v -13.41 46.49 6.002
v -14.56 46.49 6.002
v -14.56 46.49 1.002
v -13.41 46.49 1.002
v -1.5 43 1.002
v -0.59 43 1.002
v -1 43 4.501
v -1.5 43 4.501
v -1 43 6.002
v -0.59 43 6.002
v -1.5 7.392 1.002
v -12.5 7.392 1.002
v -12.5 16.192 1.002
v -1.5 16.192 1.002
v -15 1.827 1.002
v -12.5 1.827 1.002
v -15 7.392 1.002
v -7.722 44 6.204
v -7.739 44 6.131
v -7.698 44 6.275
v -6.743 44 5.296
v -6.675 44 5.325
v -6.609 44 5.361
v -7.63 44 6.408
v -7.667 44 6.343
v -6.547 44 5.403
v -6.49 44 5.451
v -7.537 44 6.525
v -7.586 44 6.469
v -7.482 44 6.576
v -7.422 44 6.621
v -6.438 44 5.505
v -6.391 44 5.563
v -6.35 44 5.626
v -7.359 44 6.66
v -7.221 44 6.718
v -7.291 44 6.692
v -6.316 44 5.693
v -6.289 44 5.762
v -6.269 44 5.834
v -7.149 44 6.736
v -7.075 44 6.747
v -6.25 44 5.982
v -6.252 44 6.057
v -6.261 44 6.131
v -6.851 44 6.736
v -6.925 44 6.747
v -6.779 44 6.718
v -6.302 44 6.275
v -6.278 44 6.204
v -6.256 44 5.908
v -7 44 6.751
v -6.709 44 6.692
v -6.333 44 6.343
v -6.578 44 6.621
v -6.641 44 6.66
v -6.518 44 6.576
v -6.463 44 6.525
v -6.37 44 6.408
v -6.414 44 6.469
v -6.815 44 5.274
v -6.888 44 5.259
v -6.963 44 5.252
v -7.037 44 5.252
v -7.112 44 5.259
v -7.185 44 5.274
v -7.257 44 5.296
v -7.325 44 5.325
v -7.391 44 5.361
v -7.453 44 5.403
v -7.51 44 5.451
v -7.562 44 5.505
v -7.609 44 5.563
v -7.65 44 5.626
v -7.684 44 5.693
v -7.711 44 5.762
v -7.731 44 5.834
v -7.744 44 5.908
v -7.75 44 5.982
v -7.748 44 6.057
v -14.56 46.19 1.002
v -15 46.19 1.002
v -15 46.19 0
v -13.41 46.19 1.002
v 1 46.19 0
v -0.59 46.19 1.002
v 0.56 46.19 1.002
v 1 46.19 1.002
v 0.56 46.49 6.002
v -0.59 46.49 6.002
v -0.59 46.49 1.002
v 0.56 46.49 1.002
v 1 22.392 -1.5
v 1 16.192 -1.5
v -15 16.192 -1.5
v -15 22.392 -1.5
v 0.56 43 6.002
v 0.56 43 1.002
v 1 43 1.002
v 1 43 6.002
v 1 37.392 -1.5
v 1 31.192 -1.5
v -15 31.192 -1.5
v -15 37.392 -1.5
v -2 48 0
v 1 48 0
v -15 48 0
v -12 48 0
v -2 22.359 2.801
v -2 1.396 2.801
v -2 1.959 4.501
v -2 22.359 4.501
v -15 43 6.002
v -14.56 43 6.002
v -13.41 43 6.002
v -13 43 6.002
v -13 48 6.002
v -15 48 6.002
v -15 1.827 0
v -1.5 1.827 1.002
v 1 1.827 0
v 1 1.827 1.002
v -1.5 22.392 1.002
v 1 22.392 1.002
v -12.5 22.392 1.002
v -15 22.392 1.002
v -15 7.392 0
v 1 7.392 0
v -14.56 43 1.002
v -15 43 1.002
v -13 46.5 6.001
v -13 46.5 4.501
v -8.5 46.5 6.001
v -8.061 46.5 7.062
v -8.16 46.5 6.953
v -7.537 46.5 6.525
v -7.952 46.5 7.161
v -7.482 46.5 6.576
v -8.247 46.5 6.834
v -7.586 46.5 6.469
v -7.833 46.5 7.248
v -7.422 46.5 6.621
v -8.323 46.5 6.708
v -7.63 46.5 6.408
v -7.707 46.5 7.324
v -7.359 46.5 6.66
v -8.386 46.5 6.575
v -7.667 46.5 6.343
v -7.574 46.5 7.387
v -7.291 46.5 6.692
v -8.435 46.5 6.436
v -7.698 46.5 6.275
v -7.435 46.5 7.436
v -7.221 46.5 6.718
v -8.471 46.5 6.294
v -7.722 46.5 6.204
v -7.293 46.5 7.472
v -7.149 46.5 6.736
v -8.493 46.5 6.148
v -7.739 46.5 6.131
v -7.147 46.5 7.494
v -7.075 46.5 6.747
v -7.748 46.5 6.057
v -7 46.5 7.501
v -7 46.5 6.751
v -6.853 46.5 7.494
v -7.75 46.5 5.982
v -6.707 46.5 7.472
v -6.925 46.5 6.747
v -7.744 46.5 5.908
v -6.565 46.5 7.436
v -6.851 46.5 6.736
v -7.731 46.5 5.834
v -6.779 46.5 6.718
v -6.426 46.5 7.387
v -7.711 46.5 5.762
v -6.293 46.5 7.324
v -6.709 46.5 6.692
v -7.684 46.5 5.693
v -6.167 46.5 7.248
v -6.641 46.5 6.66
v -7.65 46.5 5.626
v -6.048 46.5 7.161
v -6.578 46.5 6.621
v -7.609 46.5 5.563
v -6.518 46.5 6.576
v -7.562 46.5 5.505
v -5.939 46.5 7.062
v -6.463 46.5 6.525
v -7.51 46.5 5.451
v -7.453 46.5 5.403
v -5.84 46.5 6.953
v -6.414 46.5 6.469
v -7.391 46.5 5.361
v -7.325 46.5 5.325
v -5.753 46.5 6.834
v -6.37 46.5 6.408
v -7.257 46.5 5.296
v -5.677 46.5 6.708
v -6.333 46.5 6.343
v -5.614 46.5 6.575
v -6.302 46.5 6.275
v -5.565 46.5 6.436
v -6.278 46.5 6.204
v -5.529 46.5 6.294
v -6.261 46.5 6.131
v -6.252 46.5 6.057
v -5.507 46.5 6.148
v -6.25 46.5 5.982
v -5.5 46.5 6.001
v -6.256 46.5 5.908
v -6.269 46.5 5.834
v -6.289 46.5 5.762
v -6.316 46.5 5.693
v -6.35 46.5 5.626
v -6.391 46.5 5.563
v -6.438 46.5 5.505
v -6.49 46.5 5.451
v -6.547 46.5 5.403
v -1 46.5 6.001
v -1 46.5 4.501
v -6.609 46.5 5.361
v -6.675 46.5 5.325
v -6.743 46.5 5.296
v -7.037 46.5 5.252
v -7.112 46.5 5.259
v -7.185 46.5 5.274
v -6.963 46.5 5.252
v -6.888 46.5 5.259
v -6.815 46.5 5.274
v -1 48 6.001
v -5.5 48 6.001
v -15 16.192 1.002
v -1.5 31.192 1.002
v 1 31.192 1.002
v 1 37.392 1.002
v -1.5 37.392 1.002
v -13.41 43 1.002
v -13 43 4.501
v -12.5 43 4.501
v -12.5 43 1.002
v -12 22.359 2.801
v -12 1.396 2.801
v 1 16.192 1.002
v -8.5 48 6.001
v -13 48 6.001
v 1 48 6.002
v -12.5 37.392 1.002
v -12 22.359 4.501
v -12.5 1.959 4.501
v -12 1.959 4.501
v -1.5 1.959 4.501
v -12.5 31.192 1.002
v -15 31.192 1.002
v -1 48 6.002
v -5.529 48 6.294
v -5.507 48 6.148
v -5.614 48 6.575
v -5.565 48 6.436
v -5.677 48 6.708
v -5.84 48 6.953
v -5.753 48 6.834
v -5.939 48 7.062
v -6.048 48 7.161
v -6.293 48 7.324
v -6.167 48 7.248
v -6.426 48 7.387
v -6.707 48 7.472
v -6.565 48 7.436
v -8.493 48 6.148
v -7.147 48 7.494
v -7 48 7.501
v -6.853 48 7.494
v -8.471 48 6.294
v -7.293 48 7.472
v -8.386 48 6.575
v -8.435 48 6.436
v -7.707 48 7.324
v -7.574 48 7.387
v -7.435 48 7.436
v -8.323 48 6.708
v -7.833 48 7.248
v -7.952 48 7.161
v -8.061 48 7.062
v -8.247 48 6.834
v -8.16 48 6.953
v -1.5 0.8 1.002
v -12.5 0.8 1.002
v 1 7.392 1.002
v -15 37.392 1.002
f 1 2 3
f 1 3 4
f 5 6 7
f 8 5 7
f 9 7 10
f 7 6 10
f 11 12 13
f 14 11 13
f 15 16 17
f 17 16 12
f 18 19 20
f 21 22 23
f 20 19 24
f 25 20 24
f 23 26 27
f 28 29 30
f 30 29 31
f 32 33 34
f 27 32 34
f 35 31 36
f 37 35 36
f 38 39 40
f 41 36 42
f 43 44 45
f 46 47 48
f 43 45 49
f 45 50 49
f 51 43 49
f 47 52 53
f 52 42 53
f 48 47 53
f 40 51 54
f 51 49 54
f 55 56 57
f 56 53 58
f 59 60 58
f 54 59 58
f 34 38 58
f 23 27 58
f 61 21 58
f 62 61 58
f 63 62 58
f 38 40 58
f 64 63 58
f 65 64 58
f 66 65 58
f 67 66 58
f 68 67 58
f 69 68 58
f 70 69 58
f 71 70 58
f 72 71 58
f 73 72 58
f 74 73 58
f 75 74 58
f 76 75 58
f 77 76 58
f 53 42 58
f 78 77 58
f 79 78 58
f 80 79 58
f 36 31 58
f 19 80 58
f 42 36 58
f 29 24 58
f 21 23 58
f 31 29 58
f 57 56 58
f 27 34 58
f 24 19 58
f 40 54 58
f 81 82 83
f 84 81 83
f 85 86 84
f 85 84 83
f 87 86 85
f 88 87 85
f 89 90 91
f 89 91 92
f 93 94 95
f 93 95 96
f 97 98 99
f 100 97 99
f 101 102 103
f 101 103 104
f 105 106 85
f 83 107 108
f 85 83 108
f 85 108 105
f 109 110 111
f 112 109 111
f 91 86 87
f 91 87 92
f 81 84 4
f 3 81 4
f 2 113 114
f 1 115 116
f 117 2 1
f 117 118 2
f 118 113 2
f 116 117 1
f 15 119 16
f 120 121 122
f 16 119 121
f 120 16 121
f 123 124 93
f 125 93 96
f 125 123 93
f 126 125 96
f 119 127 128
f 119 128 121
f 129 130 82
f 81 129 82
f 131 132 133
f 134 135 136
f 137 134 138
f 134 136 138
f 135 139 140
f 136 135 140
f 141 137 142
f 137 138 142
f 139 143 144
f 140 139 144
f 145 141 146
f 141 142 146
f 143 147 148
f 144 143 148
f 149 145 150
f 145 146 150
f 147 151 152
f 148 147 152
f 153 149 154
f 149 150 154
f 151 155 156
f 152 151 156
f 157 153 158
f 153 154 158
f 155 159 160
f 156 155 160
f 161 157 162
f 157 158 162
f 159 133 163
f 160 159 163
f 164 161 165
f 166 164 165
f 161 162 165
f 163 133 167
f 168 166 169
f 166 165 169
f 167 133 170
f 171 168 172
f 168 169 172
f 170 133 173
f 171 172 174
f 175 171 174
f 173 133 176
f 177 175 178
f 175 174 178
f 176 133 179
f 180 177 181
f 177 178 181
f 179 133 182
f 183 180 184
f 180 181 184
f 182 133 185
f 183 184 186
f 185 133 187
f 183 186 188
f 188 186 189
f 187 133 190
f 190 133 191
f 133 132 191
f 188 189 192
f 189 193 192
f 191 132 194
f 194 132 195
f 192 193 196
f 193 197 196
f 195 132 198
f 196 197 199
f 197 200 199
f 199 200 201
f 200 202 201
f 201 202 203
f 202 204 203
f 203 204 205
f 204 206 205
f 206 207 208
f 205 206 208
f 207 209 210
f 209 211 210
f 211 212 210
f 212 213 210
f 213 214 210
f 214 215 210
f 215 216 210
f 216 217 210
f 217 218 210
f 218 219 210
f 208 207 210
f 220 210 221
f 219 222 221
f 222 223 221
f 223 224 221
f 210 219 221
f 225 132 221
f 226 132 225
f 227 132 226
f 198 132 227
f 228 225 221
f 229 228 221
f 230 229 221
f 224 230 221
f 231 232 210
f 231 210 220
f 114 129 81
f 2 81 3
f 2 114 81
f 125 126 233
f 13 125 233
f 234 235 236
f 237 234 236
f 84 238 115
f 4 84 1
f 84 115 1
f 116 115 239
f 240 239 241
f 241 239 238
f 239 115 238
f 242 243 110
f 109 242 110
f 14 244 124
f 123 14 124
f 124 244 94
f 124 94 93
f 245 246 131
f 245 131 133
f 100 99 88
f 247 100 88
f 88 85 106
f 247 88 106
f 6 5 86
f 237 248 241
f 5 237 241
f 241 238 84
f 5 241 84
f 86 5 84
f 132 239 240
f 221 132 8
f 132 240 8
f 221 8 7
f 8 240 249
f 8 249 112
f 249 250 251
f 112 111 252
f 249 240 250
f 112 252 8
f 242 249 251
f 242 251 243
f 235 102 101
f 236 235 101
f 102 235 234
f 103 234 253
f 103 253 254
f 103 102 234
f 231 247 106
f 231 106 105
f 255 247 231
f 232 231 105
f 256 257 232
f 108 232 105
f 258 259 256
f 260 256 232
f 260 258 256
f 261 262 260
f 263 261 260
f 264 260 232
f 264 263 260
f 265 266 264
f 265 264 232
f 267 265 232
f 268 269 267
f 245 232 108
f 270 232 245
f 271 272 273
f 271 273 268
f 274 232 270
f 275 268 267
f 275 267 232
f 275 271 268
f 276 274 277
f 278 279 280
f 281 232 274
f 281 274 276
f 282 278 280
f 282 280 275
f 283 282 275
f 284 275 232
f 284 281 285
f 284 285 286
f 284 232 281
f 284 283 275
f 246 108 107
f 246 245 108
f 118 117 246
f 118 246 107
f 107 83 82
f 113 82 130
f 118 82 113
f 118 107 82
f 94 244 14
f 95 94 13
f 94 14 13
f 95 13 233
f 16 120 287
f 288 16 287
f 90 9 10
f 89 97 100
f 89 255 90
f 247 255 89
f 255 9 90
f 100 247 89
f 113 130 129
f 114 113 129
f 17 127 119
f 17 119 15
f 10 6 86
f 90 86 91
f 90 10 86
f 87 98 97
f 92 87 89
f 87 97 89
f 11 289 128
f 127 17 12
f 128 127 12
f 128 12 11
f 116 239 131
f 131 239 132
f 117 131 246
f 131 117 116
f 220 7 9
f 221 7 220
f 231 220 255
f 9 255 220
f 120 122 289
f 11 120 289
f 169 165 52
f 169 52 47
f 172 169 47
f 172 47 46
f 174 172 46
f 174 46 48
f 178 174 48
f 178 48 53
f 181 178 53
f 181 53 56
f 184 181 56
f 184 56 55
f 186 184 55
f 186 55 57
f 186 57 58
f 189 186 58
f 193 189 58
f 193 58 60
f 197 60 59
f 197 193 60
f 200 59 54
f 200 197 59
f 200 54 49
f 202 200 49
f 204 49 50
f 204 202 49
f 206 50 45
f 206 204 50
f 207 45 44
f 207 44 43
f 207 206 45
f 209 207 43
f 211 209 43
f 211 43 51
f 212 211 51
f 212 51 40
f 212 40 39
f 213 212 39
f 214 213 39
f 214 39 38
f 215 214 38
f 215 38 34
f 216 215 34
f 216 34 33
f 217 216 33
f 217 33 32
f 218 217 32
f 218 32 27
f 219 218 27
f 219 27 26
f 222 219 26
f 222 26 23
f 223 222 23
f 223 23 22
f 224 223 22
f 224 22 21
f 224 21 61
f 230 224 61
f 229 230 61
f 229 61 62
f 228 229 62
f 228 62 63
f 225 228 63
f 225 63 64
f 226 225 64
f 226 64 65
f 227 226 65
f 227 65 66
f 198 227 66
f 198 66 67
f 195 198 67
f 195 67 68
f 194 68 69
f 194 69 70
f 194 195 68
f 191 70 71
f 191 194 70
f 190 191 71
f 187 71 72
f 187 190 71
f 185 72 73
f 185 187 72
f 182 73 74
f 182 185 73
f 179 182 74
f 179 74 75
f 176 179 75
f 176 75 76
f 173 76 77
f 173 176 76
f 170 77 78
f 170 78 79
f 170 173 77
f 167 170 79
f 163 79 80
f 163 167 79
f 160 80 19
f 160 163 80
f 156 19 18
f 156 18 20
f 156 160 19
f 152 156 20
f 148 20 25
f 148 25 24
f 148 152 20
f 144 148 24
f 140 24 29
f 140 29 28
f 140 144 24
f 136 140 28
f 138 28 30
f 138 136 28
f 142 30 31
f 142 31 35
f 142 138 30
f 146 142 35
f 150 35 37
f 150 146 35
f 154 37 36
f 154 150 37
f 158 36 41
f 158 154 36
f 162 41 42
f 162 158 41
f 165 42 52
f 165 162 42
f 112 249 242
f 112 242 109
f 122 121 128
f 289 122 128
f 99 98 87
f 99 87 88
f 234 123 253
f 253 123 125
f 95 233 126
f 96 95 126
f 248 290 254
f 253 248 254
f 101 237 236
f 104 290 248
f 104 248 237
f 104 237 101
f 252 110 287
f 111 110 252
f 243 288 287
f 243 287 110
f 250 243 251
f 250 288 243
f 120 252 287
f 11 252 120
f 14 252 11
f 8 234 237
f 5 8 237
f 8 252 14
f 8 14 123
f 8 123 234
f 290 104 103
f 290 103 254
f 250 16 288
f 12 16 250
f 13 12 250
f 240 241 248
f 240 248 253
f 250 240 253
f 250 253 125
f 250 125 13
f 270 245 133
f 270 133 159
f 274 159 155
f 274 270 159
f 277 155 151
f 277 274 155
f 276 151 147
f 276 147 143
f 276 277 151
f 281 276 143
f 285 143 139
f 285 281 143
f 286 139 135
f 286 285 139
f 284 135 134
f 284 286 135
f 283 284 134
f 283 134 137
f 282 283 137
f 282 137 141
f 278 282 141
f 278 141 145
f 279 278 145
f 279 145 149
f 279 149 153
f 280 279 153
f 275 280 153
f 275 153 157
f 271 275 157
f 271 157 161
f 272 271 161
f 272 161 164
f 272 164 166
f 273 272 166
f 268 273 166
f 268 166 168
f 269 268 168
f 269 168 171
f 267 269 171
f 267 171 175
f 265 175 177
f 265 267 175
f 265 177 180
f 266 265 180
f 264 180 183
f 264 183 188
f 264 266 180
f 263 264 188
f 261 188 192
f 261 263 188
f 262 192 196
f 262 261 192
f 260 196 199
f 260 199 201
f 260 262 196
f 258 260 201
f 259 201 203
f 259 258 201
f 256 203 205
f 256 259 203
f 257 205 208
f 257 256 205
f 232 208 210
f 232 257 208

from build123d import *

# Parameters (mm, degrees)
SKETCH2_W            = 14
SKETCH2_H            = 48
BOSS_EXTRUDE1_DEPTH  = 8
SKETCH3_W            = 10
SKETCH3_H            = 3.5
CUT_EXTRUDE1_DEPTH   = 51.635955605
CUT_EXTRUDE4_DEPTH   = 48
CUT_EXTRUDE5_REACH   = 51.933
SKETCH16_W           = 1.002160824
SKETCH16_H           = 48
BOSS_EXTRUDE4_DEPTH  = 1
SKETCH17_W           = 1.002160824
SKETCH17_H           = 48
BOSS_EXTRUDE5_DEPTH  = 1
SKETCH25_W           = 2
SKETCH25_H           = 5
BOSS_EXTRUDE10_DEPTH = 5
SKETCH26_W           = 12
SKETCH26_H           = 1.5
BOSS_EXTRUDE11_DEPTH = 1.5
SKETCH27_R           = 1.5
BOSS_EXTRUDE14_DEPTH = 1.5
SKETCH29_R           = 0.75
CUT_EXTRUDE12_DEPTH  = 1.5
SKETCH30_W           = 1.15
SKETCH30_H           = 3.49
CUT_EXTRUDE13_DEPTH  = 5
SKETCH32_W           = 10
SKETCH32_H           = 47.172433363
BOSS_EXTRUDE15_DEPTH = 3.5
BOSS_EXTRUDE16_DEPTH = 10
SKETCH34_W           = 10
SKETCH34_H           = 20.2
CUT_EXTRUDE15_DEPTH  = 1.7
SKETCH35_W           = 10
SKETCH35_H           = 1.7
CUT_EXTRUDE16_DEPTH  = 1
CUT_EXTRUDE18_START  = -16
SKETCH38_W           = 1.002160824
SKETCH38_H           = 8.4
SKETCH38_H_2         = 8.398563286
CUT_EXTRUDE18_DEPTH  = 16
CUT_EXTRUDE19_DEPTH  = 20
SKETCH43_W           = 16
SKETCH43_H           = 1.002160824
CUT_EXTRUDE20_DEPTH  = 0.4
SKETCH44_W           = 16
SKETCH44_H           = 1.002160824
CUT_EXTRUDE21_DEPTH  = 0.4
SKETCH45_W           = 16
SKETCH45_H           = 1.002160824
CUT_EXTRUDE22_DEPTH  = 0.4
SKETCH46_R           = 0.75
BOSS_EXTRUDE18_DEPTH = 4
SKETCH47_W           = 10
SKETCH47_H           = 1.7
CUT_EXTRUDE23_DEPTH  = 1
CUT_EXTRUDE24_DEPTH  = 0.5
CUT_EXTRUDE25_DEPTH  = 0.5
CUT_EXTRUDE26_DEPTH  = 52.14944604
SKETCH51_W           = 16
SKETCH51_H           = 6.2
BOSS_EXTRUDE19_DEPTH = 2
SKETCH52_W           = 0.5
SKETCH52_H           = 6.2
CUT_EXTRUDE27_DEPTH  = 16
SKETCH53_W           = 0.5
SKETCH53_H           = 6.2
CUT_EXTRUDE28_DEPTH  = 16


with BuildPart() as part:
    # Sketch2 → Boss-Extrude1 (new body)
    with BuildSketch(Plane.XY):
        with Locations((-7, 24)):
            Rectangle(SKETCH2_W, SKETCH2_H)
    extrude(amount=BOSS_EXTRUDE1_DEPTH)

    # Sketch3 → Cut-Extrude1 (cut, through all)
    with BuildSketch(Plane(origin=(0, 0, 0), x_dir=(-1, 0, 0), z_dir=(0, -1, 0))):
        with Locations((7, -1.75)):
            Rectangle(SKETCH3_W, SKETCH3_H)
    extrude(amount=-CUT_EXTRUDE1_DEPTH, mode=Mode.SUBTRACT)

    # Sketch7 → Cut-Extrude4 (cut)
    with BuildSketch(Plane.XZ):
        Polygon((-14, 1.002160824), (-13, 1.002160824), (-13, 4.501055273), (-1, 4.501055273), (-1, 1.002160824), (0, 1.002160824), (0, 8), (-14, 8), align=None)
    extrude(amount=-CUT_EXTRUDE4_DEPTH, mode=Mode.SUBTRACT)

    # Cut-Extrude5: up to this face of the body (flat: up to its plane)
    cut_extrude5_end = Plane(part.part.faces().sort_by_distance((-1, 24, 2.751608048))[0])
    # Sketch9 → Cut-Extrude5 (cut, up to the picked face)
    with BuildSketch(Plane.ZY.offset(13), mode=Mode.PRIVATE) as cut_extrude5_sk1:
        Polygon((1.002160824, 0), (4.501055273, 1.159229281), (4.501055273, 0), align=None)
    cut_extrude5_tool1 = split(extrude(cut_extrude5_sk1.sketch, amount=-CUT_EXTRUDE5_REACH, mode=Mode.PRIVATE), bisect_by=cut_extrude5_end, keep=Keep.BOTH, mode=Mode.PRIVATE)
    add(cut_extrude5_tool1.solids().sort_by(Axis((-13, 0.38641, 3.334757), (1, 0, 0)))[0], mode=Mode.SUBTRACT)

    # Sketch16 → Boss-Extrude4 (add)
    with BuildSketch(Plane(origin=(0, 0, 0), x_dir=(0, 0, -1), z_dir=(1, 0, 0))):
        with Locations((-0.501080412, 24)):
            Rectangle(SKETCH16_W, SKETCH16_H)
    extrude(amount=BOSS_EXTRUDE4_DEPTH)

    # Sketch17 → Boss-Extrude5 (add)
    with BuildSketch(Plane.ZY.offset(14)):
        with Locations((0.501080412, 24)):
            Rectangle(SKETCH17_W, SKETCH17_H)
    extrude(amount=BOSS_EXTRUDE5_DEPTH)

    # Sketch25 → Boss-Extrude10 (add)
    with BuildSketch(Plane.XY.offset(1.002160824)):
        with Locations((0, 45.5)):
            Rectangle(SKETCH25_W, SKETCH25_H)
        with Locations((-14, 45.5)):
            Rectangle(SKETCH25_W, SKETCH25_H)
    extrude(amount=BOSS_EXTRUDE10_DEPTH)

    # Sketch26 → Boss-Extrude11 (add)
    with BuildSketch(Plane.XY.offset(4.501055273)):
        with Locations((-7, 47.25)):
            Rectangle(SKETCH26_W, SKETCH26_H)
    extrude(amount=BOSS_EXTRUDE11_DEPTH)

    # Sketch27 → Boss-Extrude14 (add)
    with BuildSketch(Plane(origin=(0, 48, 0), x_dir=(1, 0, 0), z_dir=(0, 1, 0))):
        with Locations((-7.000000094, -6.001055273)):
            Circle(SKETCH27_R)
    extrude(amount=-BOSS_EXTRUDE14_DEPTH)

    # Sketch29 → Cut-Extrude12 (cut)
    with BuildSketch(Plane(origin=(0, 48, 0), x_dir=(1, 0, 0), z_dir=(0, 1, 0))):
        with Locations(Location((-7.000000094, -6.001055273, 0), (0, 0, 270))):
            Circle(SKETCH29_R)
    extrude(amount=-CUT_EXTRUDE12_DEPTH, mode=Mode.SUBTRACT)

    # Sketch30 → Cut-Extrude13 (cut)
    with BuildSketch(Plane.XY.offset(6.002160824)):
        with Locations((-13.985, 44.745)):
            Rectangle(SKETCH30_W, SKETCH30_H)
        with Locations((-0.015, 44.745)):
            Rectangle(SKETCH30_W, SKETCH30_H)
    extrude(amount=-CUT_EXTRUDE13_DEPTH, mode=Mode.SUBTRACT)

    # Sketch32 → Boss-Extrude15 (add)
    with BuildSketch(Plane(origin=(0, 0, 3.5), x_dir=(-1, 0, 0), z_dir=(0, 0, -1))):
        with Locations((7, 24.413783318)):
            Rectangle(SKETCH32_W, SKETCH32_H)
    extrude(amount=BOSS_EXTRUDE15_DEPTH)

    # Sketch33 → Boss-Extrude16 (add)
    with BuildSketch(Plane(origin=(-12, 0, 0), x_dir=(0, 0, -1), z_dir=(1, 0, 0))):
        Polygon((-3.5, 0.827566637), (0, 0.827566637), (0, -0.332028927), align=None)
    extrude(amount=BOSS_EXTRUDE16_DEPTH)

    # Sketch34 → Cut-Extrude15 (cut)
    with BuildSketch(Plane.XY.offset(4.501055273)):
        with Locations((-7, 11.259229281)):
            Rectangle(SKETCH34_W, SKETCH34_H)
    extrude(amount=-CUT_EXTRUDE15_DEPTH, mode=Mode.SUBTRACT)

    # Sketch35 → Cut-Extrude16 (cut)
    with BuildSketch(Plane(origin=(0, 1.159229281, 0), x_dir=(1, 0, 0), z_dir=(0, 1, 0))):
        with Locations((-7, -3.651055273)):
            Rectangle(SKETCH35_W, SKETCH35_H)
    extrude(amount=-CUT_EXTRUDE16_DEPTH, mode=Mode.SUBTRACT)

    # Sketch38 → Cut-Extrude18 (cut)
    with BuildSketch(Plane(origin=(1, 0, 0), x_dir=(0, 0, -1), z_dir=(1, 0, 0)).offset(CUT_EXTRUDE18_START)):
        with Locations((-0.501080412, 11.591582536)):
            Rectangle(SKETCH38_W, SKETCH38_H)
        with Locations((-0.501080412, 26.591582536)):
            Rectangle(SKETCH38_W, SKETCH38_H)
        with Locations((-0.501080412, 41.590864179)):
            Rectangle(SKETCH38_W, SKETCH38_H_2)
    extrude(amount=CUT_EXTRUDE18_DEPTH, mode=Mode.SUBTRACT)

    # Sketch40 → Cut-Extrude19 (cut)
    with BuildSketch(Plane.ZY.offset(15)):
        Polygon((4.501055273, 1.159229281), (0, -0.332028927), (0, 0.467971073), (4.501055273, 1.959229281), align=None)
    extrude(amount=-CUT_EXTRUDE19_DEPTH, mode=Mode.SUBTRACT)

    # Sketch43 → Cut-Extrude20 (cut)
    with BuildSketch(Plane.XZ.offset(-45.790145822)):
        with Locations((-7, 0.501080412)):
            Rectangle(SKETCH43_W, SKETCH43_H)
    extrude(amount=-CUT_EXTRUDE20_DEPTH, mode=Mode.SUBTRACT)

    # Sketch44 → Cut-Extrude21 (cut)
    with BuildSketch(Plane(origin=(0, 30.791582536, 0), x_dir=(-1, 0, 0), z_dir=(0, -1, 0))):
        with Locations((7, -0.501080412)):
            Rectangle(SKETCH44_W, SKETCH44_H)
    extrude(amount=-CUT_EXTRUDE21_DEPTH, mode=Mode.SUBTRACT)

    # Sketch45 → Cut-Extrude22 (cut)
    with BuildSketch(Plane.XZ.offset(-15.791582536)):
        with Locations((-7, 0.501080412)):
            Rectangle(SKETCH45_W, SKETCH45_H)
    extrude(amount=-CUT_EXTRUDE22_DEPTH, mode=Mode.SUBTRACT)

    # Sketch46 → Boss-Extrude18 (add)
    with BuildSketch(Plane(origin=(0, 48, 0), x_dir=(1, 0, 0), z_dir=(0, 1, 0))):
        with Locations(Location((-7.000000094, -6.001055273, 0), (0, 0, 270))):
            Circle(SKETCH46_R)
    extrude(amount=-BOSS_EXTRUDE18_DEPTH)

    # Sketch47 → Cut-Extrude23 (cut)
    with BuildSketch(Plane.XZ.offset(-21.359229281)):
        with Locations((-7, 3.651055273)):
            Rectangle(SKETCH47_W, SKETCH47_H)
    extrude(amount=-CUT_EXTRUDE23_DEPTH, mode=Mode.SUBTRACT)

    # Sketch48 → Cut-Extrude24 (cut)
    with BuildSketch(Plane(origin=(-1, 0, 0), x_dir=(0, 0, -1), z_dir=(1, 0, 0))):
        Polygon((-4.501055273, 1.959229281), (-1.002160824, 0.8), (-1.002160824, 43), (-4.501055273, 43), align=None)
    extrude(amount=-CUT_EXTRUDE24_DEPTH, mode=Mode.SUBTRACT)

    # Sketch49 → Cut-Extrude25 (cut)
    with BuildSketch(Plane.ZY.offset(13)):
        Polygon((1.002160824, 0.8), (4.501055273, 1.959229281), (4.501055273, 43), (1.002160824, 43), align=None)
    extrude(amount=-CUT_EXTRUDE25_DEPTH, mode=Mode.SUBTRACT)

    # Sketch50 → Cut-Extrude26 (cut, through all)
    with BuildSketch(Plane(origin=(1, 0, 0), x_dir=(0, 0, -1), z_dir=(1, 0, 0))):
        Polygon((-1.002160824, 0.8), (0, 0.467971073), (0, 1.826644399), (-1.002160824, 1.826644399), align=None)
    extrude(amount=-CUT_EXTRUDE26_DEPTH, mode=Mode.SUBTRACT)

    # Sketch51 → Boss-Extrude19 (add)
    with BuildSketch(Plane(origin=(0, 0, 0), x_dir=(-1, 0, 0), z_dir=(0, 0, -1))):
        with Locations((7, 19.291582536)):
            Rectangle(SKETCH51_W, SKETCH51_H)
        with Locations((7, 34.291582536)):
            Rectangle(SKETCH51_W, SKETCH51_H)
    extrude(amount=BOSS_EXTRUDE19_DEPTH)

    # Sketch52 → Cut-Extrude27 (cut)
    with BuildSketch(Plane(origin=(1, 0, 0), x_dir=(0, 0, -1), z_dir=(1, 0, 0))):
        with Locations((1.75, 19.291582536)):
            Rectangle(SKETCH52_W, SKETCH52_H)
    extrude(amount=-CUT_EXTRUDE27_DEPTH, mode=Mode.SUBTRACT)

    # Sketch53 → Cut-Extrude28 (cut)
    with BuildSketch(Plane(origin=(1, 0, 0), x_dir=(0, 0, -1), z_dir=(1, 0, 0))):
        with Locations((1.75, 34.291582536)):
            Rectangle(SKETCH53_W, SKETCH53_H)
    extrude(amount=-CUT_EXTRUDE28_DEPTH, mode=Mode.SUBTRACT)


solid = part.part
